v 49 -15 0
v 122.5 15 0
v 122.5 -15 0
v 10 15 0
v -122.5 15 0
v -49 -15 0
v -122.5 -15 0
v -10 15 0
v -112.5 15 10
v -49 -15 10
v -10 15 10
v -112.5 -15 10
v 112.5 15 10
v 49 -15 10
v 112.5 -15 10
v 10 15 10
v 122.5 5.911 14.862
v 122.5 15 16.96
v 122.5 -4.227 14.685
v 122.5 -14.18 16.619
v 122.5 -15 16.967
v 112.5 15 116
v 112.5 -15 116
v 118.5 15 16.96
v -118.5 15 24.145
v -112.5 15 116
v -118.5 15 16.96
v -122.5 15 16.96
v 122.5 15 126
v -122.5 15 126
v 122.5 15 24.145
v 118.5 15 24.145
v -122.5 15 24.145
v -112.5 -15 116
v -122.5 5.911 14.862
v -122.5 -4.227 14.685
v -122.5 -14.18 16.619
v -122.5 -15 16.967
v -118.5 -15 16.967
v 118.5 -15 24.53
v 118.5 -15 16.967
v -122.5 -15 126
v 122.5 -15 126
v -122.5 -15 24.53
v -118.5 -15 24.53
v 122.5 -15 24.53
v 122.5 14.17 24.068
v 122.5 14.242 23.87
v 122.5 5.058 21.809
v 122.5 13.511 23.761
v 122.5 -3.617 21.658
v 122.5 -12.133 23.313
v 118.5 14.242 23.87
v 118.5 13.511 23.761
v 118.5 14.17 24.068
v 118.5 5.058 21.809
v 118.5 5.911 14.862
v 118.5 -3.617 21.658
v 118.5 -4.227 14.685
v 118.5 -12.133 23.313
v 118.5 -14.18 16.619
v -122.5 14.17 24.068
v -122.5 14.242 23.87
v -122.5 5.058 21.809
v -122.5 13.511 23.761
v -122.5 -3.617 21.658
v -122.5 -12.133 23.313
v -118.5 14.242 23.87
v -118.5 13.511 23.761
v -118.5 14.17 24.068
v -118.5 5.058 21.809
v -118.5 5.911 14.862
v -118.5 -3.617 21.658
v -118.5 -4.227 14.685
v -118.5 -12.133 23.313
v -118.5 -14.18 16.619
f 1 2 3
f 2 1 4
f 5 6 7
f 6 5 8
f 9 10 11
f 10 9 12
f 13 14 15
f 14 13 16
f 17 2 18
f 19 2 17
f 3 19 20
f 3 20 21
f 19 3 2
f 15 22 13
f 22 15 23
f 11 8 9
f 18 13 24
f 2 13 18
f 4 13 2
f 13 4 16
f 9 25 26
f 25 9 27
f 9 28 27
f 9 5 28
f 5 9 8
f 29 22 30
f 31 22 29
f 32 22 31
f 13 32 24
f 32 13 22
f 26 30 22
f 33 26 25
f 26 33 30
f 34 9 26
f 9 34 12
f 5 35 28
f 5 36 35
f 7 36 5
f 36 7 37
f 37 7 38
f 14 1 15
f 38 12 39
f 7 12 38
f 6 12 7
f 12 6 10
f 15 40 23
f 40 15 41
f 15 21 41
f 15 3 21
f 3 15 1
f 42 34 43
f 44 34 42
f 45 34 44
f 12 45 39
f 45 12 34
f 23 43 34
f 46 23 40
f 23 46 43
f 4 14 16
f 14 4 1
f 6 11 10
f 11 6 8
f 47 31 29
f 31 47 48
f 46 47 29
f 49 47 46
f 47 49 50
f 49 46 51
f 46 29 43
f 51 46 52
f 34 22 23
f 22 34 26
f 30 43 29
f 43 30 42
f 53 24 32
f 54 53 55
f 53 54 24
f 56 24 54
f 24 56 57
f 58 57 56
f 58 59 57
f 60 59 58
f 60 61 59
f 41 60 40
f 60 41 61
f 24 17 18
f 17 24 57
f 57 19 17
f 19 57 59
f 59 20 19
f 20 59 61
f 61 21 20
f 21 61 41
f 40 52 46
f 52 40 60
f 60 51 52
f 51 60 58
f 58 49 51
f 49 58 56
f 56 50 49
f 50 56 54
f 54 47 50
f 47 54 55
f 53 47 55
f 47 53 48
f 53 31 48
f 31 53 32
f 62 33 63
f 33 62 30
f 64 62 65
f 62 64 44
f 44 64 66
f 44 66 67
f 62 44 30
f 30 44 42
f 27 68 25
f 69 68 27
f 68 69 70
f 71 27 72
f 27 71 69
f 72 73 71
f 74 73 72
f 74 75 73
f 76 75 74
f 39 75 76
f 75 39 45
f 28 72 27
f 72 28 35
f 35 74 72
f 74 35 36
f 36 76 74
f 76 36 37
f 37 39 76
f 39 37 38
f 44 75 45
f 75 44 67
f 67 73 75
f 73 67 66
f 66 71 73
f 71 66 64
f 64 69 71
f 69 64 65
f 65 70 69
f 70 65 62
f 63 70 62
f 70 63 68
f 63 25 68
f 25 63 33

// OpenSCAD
// file: rear_standard_tilt_slot.scad
include <../../constants.scad>

module rear_standard_tilt_slot(additional_slot_width = 0) {
    working_slot_width = rear_standard_tilt_slot_width + additional_slot_width;  
    theta = (rear_standard_tilt_slot_range) / 2;
    H = rear_standard_tilt_slot_radius + (working_slot_width / 2);
    triangle_half_width = H * tan(theta);

    rotate(a =  rear_standard_tilt_slot_rotational_offset, v = [0,0,1]) 
    intersection() {
        polygon(points = [
            [0,0],
            [H,triangle_half_width],
            [H,-triangle_half_width]
            ]);
        //slot ring
        difference() {
            circle(r = rear_standard_tilt_slot_radius + working_slot_width / 2);
            circle(r = rear_standard_tilt_slot_radius - working_slot_width / 2);
        }
    }
    rotate(a = rear_standard_tilt_slot_range / 2 + rear_standard_tilt_slot_rotational_offset, v = [0,0,1]) {
        translate(v = [H - working_slot_width / 2,0,0]) {
            circle(r = working_slot_width / 2);
        }
    }
    rotate(a = -rear_standard_tilt_slot_range / 2 + rear_standard_tilt_slot_rotational_offset, v = [0,0,1]) {
        translate(v = [H - working_slot_width / 2,0,0]) {
            circle(r = working_slot_width / 2);
        }
    }
}

rear_standard_tilt_slot();
// file: ../../constants.scad
/********************
* Table of Contents *
* *******************/
// 1. Materials
// 2. Rear Standard
    // 2.1 Rear Standard Housing
    // 2.2 Rear Standard Tilt Plate
    // 2.3 Rear Standard Rise Plate
    // 2.4 Rear Standard Carrier
// 3. Front Standard
// 4. Base
// 5. Ground Glass
// 6. Film Cassette
// 7. Movements



/****************
* 1. Materials  *
* **************/
    sheet_metal_thickness_structural = 3;
    sheet_metal_thickness_nonstructural = 2.75; // 2.75 for 3d print, 2 otherwise
    screw_hole_metric_3 = 3;
    screw_hole_metric_4 = 4;
    screw_hole_metric_5 = 5;
    screw_hole_metric_6 = 6;

/********************
* 2. Rear Standard  *
* *******************/

    // 2.1 Rear Standard Housing
    rear_standard_housing_width = 245;
    rear_standard_housing_height = 126;
    rear_standard_housing_depth = 30;
    rear_standard_housing_thickness = 10;
    rear_standard_housing_frame_width = 33;
    rear_standard_housing_tilt_slot_additional_width = 2; // screw head diameter + small margin - rear_standard_tilt_slot_width
    


    // 2.2 Rear Standard Tilt Plate
    rear_standard_tilt_plate_thickness = sheet_metal_thickness_nonstructural;
    rear_standard_tilt_slot_radius = 45;
    rear_standard_tilt_slot_width = 5;
    rear_standard_tilt_slot_range = 50;
    rear_standard_tilt_slot_rotational_offset = 5;
    rear_standard_tilt_pivot_diameter = 4;
    rear_standard_tilt_pivot_length = rear_standard_tilt_plate_thickness;



    // 2.3 Rear Standard Rise Plate
    rear_standard_rise_stud_diameter = screw_hole_metric_4;
    rear_standard_rise_plate_thickness = sheet_metal_thickness_nonstructural;


    // 2.4 Rear Standard Carrier
    rear_standard_carrier_thickness = sheet_metal_thickness_structural;
    rear_standard_carrier_width = 30;
    rear_standard_carrier_base_length = rear_standard_housing_width + ((rear_standard_tilt_plate_thickness + rear_standard_rise_plate_thickness) * 2) + (rear_standard_carrier_thickness * 2) + .25;
    rear_standard_carrier_base_ear_length = 40;
    rear_standard_carrier_base_slot_length = 160;
    rear_standard_carrier_base_slot_width = 6;
    rear_standard_carrier_upright_length = 149;
    rear_standard_carrier_upright_slot_width = 6;
    rear_standard_carrier_screw_hole_diameter = screw_hole_metric_4;
    rear_standard_carrier_screw_hole_triangle_side_length = (rear_standard_carrier_width / 3) + rear_standard_carrier_screw_hole_diameter;
    rear_standard_carrier_screw_hole_triangle_height = (rear_standard_carrier_screw_hole_triangle_side_length * sqrt(3)) / 2;
    rear_standard_carrier_screw_hole_triangle_top_margin = 5;


/****************
* 7. Movements  *
* **************/
    zero_marker_side_length = 4;
    rear_standard_rise_zero_pos = rear_standard_carrier_upright_length + rear_standard_carrier_base_ear_length / 2 - rear_standard_housing_height;
    rear_standard_rise = 0;
// main file
include <../../constants.scad>
use <rear_standard_tilt_slot.scad>

// TODO: move modules to separate files
module finger_holes(part_width) {
    num_fingers = 2;
    finger_width = rear_standard_housing_depth / (num_fingers * 2);
    finger_offset_x = (part_width / 2) - (rear_standard_housing_thickness / 2);
    base_finger_offset_y = (rear_standard_housing_depth / 2) - (finger_width / 2);
    for (i = [0:num_fingers - 1]) {
                finger_offset_y = base_finger_offset_y - finger_width * (i * 2);
                translate(v = [finger_offset_x,finger_offset_y]) {
                    square(size = [rear_standard_housing_thickness,finger_width], center = true);
                }
    }
}

module rear_standard_housing_side_long() {
    linear_extrude(height = rear_standard_housing_thickness) {
        difference() {
            square(size = [rear_standard_housing_width,rear_standard_housing_depth], center = true);
            finger_holes(part_width = rear_standard_housing_width);
            mirror(v = [1,0,0]) {
                finger_holes(part_width = rear_standard_housing_width);
            } 
        }
    }
}

module rear_standard_housing_side_long_bottom() {
    difference() {
        rear_standard_housing_side_long();
        linear_extrude(height = rear_standard_housing_thickness) 
        polygon(points = [
            [10, rear_standard_housing_depth / 2],
            [rear_standard_housing_width / 5, -(rear_standard_housing_depth / 2)],
            [-(rear_standard_housing_width / 5), -(rear_standard_housing_depth / 2)],
            [-10, rear_standard_housing_depth / 2]]
        );
    }
}

module rear_standard_housing_side_short() {
    difference() {
        linear_extrude(height = rear_standard_housing_thickness) {
            difference() {
                square(size = [rear_standard_housing_height,rear_standard_housing_depth], center = true);
                finger_holes(part_width = rear_standard_housing_height);
                mirror(v = [1,0,0]) {
                    finger_holes(part_width = rear_standard_housing_height);
                }
            }
        }
        // tilt slot
        translate(v = [0,0,-6]) {
            linear_extrude(height = rear_standard_housing_thickness) {
                rear_standard_tilt_slot(additional_slot_width = rear_standard_housing_tilt_slot_additional_width);
            } 
        } 
    }
}

module rear_standard_housing() {
    rear_standard_housing_side_long_bottom();
    translate(v = [0,0,rear_standard_housing_height - rear_standard_housing_thickness]) {
        rear_standard_housing_side_long();
    }
    translate(v = [rear_standard_housing_width / 2,0,rear_standard_housing_height / 2]) {
        rotate(a = [0,90,180]) {
            rear_standard_housing_side_short();
        } 
    }
    mirror(v = [1,0,0]) {
        translate(v = [rear_standard_housing_width / 2,0,rear_standard_housing_height / 2]) {
            rotate(a = [0,90,180]) {
                rear_standard_housing_side_short();
            } 
        } 
    }
}

rear_standard_housing();


// rear_standard_housing_side_long();
// rear_standard_housing_side_short();
